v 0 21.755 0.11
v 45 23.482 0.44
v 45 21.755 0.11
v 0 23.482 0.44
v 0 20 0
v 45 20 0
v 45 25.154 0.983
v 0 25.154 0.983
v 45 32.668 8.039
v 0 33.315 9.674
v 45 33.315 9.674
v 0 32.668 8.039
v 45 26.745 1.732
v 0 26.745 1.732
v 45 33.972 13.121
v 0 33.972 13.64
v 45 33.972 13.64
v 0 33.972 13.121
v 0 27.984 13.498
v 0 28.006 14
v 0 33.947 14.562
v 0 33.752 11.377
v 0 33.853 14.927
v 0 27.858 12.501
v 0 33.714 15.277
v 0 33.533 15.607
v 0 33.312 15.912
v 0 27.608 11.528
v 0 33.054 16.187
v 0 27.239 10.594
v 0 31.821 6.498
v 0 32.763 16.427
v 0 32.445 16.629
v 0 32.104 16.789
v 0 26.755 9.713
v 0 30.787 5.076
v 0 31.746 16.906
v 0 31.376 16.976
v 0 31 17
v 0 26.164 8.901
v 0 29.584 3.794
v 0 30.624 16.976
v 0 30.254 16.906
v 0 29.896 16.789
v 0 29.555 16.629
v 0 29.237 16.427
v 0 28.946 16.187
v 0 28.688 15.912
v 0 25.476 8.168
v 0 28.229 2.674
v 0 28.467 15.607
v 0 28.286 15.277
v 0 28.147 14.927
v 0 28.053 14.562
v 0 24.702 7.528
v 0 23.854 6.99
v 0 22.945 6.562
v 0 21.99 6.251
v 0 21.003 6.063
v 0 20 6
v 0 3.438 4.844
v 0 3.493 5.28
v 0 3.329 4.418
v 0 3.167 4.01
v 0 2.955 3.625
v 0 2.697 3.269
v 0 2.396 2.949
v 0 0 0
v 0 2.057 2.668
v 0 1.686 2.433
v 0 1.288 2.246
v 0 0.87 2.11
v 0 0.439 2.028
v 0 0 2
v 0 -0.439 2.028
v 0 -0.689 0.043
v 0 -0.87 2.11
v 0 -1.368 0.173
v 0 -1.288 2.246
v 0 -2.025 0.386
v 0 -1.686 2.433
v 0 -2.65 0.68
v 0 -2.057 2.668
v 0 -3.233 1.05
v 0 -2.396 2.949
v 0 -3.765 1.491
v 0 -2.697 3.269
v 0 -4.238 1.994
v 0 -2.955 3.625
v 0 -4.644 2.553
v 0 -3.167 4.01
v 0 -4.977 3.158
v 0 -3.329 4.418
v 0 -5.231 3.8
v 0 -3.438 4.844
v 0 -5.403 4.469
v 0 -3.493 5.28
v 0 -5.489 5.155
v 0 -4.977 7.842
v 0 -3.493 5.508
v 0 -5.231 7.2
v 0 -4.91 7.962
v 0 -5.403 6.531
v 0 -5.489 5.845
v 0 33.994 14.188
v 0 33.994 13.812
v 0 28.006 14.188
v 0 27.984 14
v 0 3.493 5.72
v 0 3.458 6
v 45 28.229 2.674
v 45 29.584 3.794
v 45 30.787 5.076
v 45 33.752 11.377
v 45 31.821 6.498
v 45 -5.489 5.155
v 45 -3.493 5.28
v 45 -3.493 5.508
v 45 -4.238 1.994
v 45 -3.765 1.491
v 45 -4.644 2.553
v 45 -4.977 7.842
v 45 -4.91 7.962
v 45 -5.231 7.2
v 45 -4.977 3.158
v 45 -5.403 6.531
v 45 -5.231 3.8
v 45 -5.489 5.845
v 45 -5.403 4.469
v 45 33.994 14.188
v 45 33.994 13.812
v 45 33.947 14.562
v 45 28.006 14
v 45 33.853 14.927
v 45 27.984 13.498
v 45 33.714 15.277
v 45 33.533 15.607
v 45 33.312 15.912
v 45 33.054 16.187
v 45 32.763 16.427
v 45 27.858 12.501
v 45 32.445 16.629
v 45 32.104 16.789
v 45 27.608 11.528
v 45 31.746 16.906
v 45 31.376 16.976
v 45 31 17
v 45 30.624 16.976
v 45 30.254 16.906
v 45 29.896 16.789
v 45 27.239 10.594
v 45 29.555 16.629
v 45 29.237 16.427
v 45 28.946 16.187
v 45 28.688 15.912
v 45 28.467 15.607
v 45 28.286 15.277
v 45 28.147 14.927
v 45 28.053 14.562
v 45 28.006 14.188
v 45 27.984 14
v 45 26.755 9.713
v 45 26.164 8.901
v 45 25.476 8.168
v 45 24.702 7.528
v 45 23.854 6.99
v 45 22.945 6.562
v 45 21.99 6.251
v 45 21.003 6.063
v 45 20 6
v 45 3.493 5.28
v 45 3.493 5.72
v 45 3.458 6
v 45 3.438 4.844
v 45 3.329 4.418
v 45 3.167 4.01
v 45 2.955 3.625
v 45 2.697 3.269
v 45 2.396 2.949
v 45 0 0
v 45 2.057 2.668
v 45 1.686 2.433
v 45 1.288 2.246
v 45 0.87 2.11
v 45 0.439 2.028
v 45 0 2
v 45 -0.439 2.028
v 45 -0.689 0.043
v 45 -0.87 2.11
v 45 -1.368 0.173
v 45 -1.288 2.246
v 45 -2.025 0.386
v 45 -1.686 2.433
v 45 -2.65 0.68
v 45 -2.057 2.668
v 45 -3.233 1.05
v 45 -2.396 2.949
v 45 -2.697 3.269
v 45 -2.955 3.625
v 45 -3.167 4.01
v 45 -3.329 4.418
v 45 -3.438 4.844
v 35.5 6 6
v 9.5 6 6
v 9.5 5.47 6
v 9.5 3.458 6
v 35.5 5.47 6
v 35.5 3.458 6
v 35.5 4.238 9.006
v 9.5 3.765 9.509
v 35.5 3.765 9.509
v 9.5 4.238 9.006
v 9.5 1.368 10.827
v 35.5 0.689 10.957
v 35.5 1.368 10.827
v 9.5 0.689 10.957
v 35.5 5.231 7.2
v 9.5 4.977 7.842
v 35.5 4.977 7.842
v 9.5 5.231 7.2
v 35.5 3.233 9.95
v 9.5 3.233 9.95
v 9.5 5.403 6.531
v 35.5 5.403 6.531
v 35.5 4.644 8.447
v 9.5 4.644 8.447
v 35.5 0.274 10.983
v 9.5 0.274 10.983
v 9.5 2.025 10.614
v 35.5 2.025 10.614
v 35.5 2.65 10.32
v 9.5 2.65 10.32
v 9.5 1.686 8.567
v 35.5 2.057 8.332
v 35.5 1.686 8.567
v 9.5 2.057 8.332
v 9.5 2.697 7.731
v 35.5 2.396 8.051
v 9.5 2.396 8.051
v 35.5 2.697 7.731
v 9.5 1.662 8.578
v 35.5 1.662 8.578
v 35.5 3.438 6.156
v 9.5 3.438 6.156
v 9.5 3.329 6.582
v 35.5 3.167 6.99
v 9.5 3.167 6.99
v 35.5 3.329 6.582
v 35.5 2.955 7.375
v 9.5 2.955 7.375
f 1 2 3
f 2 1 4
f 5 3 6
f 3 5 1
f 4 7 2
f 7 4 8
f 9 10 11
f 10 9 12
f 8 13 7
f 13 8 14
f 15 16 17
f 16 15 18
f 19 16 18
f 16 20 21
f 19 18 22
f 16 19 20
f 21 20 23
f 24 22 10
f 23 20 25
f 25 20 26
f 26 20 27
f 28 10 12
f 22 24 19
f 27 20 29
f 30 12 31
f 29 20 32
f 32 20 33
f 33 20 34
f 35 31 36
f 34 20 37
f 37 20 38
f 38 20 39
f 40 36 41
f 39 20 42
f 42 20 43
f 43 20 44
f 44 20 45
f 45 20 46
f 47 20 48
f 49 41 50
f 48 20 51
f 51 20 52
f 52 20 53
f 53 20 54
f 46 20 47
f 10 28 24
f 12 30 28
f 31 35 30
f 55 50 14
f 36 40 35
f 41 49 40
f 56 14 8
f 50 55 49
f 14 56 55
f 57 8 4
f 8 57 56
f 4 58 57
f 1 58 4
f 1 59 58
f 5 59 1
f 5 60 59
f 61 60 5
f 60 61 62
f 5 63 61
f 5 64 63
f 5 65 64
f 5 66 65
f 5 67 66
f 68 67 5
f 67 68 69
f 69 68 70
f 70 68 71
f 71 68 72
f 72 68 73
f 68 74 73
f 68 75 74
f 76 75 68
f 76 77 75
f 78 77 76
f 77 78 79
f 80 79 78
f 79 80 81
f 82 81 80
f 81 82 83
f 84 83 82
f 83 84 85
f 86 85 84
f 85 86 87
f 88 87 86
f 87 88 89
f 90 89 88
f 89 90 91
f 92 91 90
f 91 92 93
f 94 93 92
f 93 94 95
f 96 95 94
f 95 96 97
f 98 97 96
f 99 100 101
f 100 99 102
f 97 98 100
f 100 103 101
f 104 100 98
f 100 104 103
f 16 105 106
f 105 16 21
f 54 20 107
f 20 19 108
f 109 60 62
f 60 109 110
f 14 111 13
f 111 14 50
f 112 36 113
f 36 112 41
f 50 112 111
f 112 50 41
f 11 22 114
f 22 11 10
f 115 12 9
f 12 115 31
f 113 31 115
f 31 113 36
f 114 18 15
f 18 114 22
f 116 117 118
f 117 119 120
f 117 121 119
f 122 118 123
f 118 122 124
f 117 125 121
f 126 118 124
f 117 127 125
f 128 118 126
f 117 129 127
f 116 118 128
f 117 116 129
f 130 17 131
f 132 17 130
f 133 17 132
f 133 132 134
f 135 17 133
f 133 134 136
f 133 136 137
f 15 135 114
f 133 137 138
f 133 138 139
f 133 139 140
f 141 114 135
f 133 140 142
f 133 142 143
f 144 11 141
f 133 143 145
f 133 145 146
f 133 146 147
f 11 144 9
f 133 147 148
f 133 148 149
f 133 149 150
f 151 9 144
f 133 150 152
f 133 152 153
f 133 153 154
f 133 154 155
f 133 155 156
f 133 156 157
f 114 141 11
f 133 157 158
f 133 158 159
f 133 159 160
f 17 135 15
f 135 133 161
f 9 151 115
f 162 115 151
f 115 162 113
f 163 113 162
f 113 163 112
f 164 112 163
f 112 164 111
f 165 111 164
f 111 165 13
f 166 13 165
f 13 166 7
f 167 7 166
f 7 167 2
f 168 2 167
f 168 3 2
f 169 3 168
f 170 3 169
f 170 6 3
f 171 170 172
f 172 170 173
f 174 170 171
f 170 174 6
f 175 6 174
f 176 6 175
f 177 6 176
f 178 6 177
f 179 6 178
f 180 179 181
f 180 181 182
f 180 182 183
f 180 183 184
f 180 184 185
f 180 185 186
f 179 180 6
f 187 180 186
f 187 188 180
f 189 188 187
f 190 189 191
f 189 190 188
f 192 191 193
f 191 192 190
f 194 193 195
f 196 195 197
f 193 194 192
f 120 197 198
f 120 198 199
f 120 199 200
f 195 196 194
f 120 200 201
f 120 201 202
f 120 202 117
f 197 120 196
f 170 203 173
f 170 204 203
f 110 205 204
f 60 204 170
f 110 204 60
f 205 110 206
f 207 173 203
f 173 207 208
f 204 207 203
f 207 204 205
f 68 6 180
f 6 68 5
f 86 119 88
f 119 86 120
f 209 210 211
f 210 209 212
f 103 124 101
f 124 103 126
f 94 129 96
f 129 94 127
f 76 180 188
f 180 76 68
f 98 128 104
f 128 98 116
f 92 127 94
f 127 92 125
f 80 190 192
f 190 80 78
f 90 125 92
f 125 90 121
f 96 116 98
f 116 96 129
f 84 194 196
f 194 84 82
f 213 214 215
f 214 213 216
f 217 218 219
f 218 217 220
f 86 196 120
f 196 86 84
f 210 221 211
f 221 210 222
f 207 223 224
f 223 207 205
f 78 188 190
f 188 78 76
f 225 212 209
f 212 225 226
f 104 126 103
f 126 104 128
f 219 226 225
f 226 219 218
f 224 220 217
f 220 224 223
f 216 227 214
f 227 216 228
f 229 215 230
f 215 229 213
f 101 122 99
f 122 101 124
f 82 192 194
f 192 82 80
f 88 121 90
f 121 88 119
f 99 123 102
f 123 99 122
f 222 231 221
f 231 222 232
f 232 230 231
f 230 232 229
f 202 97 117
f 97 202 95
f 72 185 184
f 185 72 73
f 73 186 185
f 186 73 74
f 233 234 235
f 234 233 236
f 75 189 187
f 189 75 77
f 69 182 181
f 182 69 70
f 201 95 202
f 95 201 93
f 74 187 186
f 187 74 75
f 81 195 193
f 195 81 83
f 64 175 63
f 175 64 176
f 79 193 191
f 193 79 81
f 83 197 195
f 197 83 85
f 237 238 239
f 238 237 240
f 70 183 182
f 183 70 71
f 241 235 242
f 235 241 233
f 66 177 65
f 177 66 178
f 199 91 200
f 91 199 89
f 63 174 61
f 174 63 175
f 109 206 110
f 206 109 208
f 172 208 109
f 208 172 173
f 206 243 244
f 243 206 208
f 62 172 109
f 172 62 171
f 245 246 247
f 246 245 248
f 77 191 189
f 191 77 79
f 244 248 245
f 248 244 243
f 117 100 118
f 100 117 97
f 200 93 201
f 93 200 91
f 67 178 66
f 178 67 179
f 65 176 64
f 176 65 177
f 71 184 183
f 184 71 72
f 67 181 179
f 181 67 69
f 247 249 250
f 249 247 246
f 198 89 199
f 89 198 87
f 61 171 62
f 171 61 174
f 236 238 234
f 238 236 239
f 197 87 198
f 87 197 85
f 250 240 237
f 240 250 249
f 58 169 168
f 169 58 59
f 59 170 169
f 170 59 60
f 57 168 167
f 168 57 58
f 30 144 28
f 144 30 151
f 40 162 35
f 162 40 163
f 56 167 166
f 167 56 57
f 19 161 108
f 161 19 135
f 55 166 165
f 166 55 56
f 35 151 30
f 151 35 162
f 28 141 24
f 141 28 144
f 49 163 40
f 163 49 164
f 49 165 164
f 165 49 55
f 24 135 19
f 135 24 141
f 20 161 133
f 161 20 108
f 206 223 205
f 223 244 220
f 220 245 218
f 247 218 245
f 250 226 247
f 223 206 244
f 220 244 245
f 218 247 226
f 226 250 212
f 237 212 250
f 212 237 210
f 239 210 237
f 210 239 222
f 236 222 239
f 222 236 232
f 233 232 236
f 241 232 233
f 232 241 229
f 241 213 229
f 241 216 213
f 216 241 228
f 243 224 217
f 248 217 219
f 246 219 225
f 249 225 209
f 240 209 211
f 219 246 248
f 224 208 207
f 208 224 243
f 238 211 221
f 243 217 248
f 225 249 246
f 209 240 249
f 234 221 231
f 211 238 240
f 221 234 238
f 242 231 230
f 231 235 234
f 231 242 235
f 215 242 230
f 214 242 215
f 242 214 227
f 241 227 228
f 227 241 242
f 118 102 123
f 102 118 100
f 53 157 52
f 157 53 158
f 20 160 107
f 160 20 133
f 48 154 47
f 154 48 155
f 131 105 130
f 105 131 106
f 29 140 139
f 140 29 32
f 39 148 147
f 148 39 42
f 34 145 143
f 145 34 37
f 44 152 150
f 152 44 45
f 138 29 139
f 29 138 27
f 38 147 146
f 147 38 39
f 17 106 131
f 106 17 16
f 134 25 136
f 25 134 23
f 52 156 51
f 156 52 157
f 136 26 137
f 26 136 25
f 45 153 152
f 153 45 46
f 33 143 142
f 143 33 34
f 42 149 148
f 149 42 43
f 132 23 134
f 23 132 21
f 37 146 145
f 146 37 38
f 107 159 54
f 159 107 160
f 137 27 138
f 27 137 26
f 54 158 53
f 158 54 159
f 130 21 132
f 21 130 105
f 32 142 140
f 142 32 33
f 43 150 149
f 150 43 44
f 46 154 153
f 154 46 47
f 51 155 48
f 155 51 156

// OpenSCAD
$fn = 50;
dicke_flach = 6;
radius_dick = 14;
radius_vorn_aussen = 5.5;
laenge_flach = 20;
breite = 45;
breite_zwick = 26;
difference(){
    union(){
        cube([45,laenge_flach,dicke_flach]);
        translate([0, 0, 5.5]){
            rotate([0,90,0]){
                cylinder(breite, radius_vorn_aussen, radius_vorn_aussen);
                };
            };
        translate([0,laenge_flach,radius_dick]){
            rotate([0,90,0]){
                cylinder(45, radius_dick, radius_dick);
                    cylinder(breite, 8, 8);
                };
            };    
        };
    union(){
        rotate([0,90,0]){
            translate([-radius_vorn_aussen, 0, 0]){
                cylinder(breite, 3.5, 3.5);
                };
            translate([-radius_dick, laenge_flach, 0]){
                cylinder(breite, radius_dick-dicke_flach, radius_dick-dicke_flach);
                };
            };
       translate([0,6,dicke_flach]){
           cube([breite,14,80]);
           };     
        };        
       translate([0,6,radius_dick]){
           cube([breite,80,80]);
           };     
       translate([0, 0, dicke_flach]){
           cube([(breite-breite_zwick)/2,10,80]);
           };     
       translate([breite-(breite-breite_zwick)/2,0,dicke_flach]){
           cube([(breite-breite_zwick)/2,10,80]);
           };  
        translate([0,-3.2,5]){
            rotate([30, 0, 0]){
                cube([breite, 6, 10]);
                };
            };   
    };
rotate([0,90,0]){
    translate([-radius_dick, laenge_flach+radius_dick-dicke_flach/2, 0]){
        cylinder(45, dicke_flach/2, dicke_flach/2);
        };
    };
